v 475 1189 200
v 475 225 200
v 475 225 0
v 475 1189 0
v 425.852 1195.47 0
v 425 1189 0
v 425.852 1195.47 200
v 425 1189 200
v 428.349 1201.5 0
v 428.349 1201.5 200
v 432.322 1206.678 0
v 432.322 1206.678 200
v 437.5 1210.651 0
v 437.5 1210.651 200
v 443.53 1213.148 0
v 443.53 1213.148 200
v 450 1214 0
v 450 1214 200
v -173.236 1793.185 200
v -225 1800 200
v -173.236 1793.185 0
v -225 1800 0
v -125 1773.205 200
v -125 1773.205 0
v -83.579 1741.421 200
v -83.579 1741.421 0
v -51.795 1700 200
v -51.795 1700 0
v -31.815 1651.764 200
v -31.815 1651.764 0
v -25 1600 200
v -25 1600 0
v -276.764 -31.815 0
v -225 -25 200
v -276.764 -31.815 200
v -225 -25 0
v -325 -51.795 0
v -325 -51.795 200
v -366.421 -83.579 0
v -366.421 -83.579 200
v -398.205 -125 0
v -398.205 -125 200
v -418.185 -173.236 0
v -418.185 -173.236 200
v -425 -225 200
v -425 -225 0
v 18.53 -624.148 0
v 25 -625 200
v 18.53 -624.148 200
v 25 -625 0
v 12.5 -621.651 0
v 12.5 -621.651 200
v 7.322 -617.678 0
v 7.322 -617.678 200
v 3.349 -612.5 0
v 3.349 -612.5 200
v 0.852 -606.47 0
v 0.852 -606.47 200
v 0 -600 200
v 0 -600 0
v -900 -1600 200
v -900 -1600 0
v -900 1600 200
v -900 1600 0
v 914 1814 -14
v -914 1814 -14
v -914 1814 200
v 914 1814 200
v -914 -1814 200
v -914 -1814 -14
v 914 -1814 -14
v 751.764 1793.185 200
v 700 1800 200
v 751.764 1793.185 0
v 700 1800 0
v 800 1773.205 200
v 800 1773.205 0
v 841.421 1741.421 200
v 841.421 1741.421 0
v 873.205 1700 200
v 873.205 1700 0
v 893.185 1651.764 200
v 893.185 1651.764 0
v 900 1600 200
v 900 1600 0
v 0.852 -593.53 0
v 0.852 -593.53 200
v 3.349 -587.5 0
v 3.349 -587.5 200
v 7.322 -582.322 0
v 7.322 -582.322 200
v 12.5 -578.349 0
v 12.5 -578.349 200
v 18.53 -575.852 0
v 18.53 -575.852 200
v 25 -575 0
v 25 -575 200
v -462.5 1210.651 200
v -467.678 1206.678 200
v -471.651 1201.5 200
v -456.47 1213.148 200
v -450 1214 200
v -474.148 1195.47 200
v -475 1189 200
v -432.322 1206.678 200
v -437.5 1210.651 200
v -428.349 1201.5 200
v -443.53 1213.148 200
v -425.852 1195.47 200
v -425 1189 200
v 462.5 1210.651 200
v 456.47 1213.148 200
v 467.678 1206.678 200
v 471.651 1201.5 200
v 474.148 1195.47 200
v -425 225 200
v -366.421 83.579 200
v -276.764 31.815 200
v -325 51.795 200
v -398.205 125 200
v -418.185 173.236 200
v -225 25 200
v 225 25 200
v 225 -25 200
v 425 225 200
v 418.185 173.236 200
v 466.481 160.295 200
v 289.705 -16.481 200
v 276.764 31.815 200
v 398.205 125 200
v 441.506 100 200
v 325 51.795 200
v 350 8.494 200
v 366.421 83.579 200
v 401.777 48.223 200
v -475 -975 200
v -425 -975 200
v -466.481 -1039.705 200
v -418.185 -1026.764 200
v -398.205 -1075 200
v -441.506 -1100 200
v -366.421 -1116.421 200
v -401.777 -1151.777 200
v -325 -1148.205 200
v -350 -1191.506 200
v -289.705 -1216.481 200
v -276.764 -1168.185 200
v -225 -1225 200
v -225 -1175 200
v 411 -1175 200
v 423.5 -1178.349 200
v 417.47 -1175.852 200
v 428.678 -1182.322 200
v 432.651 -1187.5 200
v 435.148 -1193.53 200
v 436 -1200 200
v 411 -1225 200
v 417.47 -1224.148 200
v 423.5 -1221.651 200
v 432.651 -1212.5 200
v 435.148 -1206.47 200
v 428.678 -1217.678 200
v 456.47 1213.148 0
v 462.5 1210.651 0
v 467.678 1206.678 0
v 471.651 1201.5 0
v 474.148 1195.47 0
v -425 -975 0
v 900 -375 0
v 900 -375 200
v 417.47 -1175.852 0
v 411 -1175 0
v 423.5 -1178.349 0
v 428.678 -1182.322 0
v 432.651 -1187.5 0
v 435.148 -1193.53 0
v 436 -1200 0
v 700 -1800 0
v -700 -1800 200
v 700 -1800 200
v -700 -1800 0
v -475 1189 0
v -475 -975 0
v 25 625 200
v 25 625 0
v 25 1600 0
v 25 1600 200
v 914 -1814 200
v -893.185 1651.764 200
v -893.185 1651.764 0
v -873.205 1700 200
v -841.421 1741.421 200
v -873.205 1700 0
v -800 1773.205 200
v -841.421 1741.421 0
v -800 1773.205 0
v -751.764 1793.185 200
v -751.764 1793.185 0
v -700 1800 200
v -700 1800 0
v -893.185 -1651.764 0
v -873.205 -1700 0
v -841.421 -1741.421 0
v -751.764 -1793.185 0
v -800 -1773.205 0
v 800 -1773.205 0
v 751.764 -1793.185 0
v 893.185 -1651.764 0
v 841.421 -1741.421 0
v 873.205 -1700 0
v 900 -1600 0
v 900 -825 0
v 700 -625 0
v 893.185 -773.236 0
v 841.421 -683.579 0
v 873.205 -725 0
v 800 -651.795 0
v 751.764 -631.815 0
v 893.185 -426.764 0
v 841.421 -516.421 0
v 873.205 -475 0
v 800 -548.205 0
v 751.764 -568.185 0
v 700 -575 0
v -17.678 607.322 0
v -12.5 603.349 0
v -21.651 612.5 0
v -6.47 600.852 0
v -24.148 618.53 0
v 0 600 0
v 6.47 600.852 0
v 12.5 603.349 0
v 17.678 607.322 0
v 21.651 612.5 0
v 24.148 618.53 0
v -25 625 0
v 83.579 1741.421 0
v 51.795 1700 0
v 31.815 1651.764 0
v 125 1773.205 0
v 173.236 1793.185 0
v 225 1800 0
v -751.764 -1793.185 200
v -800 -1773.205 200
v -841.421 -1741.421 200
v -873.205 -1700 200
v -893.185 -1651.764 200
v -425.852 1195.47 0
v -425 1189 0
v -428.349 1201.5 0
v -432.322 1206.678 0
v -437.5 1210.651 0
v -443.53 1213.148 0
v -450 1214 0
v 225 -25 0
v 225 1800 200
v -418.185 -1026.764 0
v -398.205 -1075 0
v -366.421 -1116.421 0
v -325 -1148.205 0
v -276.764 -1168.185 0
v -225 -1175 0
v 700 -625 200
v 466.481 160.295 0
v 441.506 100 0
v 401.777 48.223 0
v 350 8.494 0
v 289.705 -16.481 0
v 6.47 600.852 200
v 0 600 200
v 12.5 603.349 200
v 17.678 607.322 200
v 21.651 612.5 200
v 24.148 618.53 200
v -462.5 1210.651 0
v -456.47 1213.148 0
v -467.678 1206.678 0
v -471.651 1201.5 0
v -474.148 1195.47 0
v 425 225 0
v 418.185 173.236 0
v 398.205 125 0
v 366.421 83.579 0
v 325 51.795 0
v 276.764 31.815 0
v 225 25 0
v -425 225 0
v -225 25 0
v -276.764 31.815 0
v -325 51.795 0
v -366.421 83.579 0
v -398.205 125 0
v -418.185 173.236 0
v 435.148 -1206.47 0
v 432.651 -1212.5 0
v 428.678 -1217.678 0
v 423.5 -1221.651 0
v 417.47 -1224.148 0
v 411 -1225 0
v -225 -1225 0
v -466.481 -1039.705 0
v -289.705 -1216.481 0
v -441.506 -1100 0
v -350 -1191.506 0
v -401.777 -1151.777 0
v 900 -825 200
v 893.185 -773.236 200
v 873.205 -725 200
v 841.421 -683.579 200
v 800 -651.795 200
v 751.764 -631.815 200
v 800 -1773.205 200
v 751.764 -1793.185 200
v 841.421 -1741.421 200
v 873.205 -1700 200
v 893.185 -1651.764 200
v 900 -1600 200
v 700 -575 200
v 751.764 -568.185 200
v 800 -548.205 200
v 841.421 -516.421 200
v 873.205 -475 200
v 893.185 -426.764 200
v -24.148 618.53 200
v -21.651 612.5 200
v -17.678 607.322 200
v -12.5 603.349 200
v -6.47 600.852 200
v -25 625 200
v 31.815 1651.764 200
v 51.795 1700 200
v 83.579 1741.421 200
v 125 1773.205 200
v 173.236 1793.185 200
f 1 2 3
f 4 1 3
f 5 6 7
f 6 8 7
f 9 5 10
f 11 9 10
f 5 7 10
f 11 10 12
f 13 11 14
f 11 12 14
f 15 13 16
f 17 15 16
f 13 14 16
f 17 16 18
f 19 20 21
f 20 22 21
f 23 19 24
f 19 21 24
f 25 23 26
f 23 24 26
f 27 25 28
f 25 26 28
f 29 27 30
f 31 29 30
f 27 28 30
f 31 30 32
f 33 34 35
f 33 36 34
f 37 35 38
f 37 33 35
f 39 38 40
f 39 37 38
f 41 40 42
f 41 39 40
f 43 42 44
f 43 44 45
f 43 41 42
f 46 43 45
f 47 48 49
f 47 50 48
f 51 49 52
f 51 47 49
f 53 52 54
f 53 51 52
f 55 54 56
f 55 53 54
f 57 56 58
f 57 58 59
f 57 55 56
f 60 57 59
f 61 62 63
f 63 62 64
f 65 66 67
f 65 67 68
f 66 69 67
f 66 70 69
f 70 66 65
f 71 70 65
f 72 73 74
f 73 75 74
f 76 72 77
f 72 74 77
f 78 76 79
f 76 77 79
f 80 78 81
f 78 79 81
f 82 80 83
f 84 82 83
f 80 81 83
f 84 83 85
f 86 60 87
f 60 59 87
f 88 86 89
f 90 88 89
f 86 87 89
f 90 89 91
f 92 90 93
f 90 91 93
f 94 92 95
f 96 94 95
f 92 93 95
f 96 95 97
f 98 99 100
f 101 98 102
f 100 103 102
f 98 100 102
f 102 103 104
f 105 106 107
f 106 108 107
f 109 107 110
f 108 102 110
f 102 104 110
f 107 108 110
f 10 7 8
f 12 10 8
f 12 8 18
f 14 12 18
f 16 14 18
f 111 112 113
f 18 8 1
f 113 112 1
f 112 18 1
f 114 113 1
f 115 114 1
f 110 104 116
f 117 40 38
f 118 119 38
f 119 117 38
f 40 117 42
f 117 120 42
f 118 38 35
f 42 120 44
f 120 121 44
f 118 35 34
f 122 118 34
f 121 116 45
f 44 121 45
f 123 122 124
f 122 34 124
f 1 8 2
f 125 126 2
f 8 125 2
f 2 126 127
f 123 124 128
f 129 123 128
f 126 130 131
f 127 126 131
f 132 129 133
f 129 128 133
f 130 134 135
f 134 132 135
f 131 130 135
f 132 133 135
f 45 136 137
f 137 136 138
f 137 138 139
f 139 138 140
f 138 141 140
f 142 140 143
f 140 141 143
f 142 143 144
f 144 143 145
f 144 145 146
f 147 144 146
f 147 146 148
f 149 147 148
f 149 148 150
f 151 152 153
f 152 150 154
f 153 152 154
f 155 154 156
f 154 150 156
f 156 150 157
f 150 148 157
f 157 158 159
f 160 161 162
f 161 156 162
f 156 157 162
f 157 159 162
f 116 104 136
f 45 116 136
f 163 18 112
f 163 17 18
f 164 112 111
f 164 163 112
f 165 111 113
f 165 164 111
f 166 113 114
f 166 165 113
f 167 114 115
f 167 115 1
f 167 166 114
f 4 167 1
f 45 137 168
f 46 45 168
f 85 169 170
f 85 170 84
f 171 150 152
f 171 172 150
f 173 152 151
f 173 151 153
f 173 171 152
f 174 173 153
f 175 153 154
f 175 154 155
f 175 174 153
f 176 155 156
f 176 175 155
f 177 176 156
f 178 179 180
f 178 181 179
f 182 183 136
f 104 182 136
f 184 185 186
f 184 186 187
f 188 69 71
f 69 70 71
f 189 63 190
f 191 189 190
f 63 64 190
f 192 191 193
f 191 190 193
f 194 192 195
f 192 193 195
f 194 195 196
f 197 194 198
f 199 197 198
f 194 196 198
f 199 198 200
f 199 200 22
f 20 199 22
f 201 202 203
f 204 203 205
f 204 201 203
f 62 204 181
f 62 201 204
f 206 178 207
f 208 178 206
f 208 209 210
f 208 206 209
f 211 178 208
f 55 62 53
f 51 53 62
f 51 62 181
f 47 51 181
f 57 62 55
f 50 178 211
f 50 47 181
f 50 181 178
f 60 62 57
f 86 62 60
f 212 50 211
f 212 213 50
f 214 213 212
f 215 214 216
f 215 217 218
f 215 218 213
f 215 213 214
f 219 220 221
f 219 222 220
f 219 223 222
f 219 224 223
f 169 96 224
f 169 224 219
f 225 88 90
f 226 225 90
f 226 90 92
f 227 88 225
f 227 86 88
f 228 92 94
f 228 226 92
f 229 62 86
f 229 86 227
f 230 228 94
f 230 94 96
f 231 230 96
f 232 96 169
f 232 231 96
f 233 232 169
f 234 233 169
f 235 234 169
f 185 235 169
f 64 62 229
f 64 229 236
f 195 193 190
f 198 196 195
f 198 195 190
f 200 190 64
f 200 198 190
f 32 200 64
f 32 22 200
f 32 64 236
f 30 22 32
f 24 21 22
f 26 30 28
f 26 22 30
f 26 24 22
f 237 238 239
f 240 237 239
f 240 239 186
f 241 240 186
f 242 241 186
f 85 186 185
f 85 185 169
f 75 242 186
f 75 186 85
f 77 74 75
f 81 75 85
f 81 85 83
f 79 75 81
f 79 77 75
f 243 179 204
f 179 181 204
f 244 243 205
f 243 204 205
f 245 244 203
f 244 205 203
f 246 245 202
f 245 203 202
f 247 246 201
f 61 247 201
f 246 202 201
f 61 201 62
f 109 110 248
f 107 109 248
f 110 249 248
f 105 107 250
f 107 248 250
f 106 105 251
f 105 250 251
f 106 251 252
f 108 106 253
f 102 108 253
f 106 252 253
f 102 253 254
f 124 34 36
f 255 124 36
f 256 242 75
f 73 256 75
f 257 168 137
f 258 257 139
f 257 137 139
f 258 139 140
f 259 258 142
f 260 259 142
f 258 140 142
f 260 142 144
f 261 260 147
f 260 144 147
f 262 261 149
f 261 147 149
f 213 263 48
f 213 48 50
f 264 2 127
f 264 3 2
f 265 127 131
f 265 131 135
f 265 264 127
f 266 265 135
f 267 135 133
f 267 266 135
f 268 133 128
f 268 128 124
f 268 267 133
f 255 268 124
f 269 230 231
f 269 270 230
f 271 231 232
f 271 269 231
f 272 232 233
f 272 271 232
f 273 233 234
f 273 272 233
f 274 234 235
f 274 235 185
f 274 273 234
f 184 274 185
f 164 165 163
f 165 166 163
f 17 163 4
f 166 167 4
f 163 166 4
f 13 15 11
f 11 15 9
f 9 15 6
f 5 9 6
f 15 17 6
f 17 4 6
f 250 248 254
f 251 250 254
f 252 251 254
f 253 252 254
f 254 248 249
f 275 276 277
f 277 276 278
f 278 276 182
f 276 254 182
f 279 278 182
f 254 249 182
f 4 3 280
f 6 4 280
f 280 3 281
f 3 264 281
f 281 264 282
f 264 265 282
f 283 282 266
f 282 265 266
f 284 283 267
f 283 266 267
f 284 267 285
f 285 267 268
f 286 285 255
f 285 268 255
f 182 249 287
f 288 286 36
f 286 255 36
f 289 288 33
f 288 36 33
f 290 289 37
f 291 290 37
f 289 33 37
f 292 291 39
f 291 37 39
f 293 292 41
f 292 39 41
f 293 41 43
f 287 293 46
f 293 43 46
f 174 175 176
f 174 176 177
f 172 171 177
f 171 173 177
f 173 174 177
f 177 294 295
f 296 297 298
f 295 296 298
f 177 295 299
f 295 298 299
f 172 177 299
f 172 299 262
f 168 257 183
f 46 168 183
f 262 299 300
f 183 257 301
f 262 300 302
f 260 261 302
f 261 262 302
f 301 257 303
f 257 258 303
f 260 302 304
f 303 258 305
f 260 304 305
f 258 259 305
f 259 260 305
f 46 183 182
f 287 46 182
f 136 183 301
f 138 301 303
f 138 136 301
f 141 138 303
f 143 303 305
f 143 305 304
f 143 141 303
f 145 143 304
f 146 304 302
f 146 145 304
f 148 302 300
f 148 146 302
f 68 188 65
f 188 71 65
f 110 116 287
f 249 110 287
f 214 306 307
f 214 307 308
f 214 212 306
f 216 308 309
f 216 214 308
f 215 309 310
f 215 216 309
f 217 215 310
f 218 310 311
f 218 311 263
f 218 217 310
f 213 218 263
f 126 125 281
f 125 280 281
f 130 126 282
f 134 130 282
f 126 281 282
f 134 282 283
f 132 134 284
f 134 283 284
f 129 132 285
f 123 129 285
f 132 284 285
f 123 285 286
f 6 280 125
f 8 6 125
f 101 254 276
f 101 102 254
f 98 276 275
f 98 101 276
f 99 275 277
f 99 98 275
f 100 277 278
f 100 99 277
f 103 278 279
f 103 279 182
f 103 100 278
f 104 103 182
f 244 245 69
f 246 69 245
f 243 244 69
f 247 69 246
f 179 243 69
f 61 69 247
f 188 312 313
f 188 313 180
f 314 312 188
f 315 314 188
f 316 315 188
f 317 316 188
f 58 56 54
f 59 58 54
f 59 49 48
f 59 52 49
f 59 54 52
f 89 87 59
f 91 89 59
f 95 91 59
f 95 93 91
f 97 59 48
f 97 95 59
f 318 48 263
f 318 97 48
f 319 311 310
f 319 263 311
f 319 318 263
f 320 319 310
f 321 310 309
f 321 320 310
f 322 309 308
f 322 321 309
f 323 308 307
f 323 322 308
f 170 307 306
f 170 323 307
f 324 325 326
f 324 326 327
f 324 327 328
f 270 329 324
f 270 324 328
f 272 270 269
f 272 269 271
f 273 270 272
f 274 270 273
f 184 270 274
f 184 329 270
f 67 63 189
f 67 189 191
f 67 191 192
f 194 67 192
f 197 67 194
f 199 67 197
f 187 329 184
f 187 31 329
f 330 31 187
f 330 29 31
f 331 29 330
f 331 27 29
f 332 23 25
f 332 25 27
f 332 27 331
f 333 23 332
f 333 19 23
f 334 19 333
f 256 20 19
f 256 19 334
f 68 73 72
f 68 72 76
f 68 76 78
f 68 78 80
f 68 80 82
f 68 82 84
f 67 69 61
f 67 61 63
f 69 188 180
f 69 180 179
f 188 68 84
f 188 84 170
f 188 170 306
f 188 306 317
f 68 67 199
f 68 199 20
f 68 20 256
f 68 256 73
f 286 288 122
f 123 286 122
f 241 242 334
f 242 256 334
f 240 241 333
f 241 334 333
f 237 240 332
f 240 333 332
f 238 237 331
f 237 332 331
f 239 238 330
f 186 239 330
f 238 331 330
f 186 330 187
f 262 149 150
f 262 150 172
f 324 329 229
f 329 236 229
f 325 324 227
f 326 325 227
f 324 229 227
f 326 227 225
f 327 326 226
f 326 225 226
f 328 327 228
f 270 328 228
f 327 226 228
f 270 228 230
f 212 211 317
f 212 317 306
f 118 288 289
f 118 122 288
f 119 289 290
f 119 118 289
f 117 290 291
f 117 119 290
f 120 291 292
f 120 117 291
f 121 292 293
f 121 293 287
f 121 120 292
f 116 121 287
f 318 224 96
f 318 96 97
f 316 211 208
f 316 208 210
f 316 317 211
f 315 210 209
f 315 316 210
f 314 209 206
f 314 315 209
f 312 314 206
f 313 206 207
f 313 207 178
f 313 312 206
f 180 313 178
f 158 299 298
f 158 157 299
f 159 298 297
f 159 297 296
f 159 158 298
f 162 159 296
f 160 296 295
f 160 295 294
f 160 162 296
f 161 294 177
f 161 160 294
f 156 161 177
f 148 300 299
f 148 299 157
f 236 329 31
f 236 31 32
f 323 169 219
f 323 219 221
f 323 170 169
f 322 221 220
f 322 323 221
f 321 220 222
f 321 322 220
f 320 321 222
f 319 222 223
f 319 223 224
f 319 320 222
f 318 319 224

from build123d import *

# Parameters (mm, degrees)
F6_W          = 1828
F6_H          = 3628
F7_DEPTH      = 14
F7_DEPTH_BACK = 200
F8_T          = -14
F14_W         = 50
F14_H         = 200
F13_W         = 50
F13_H         = 200
F12_W         = 50
F12_H         = 200
F20_R         = 200
F20_2_R       = 200
F21_R         = 24.99999
F21_2_R       = 24.99999
F22_R         = 250


# Not quite as in the source:
# - a fillet or chamfer is up to 0.001 mm smaller than in the source, because OpenCascade refuses the exact size


with BuildPart() as f7:
    # F6 (on Top) → F7 (new body, two sides)
    with BuildSketch(Plane.XY) as f7_sk:
        Rectangle(F6_W, F6_H)
    extrude(amount=-F7_DEPTH)
    extrude(f7_sk.sketch, amount=F7_DEPTH_BACK)

    # F8
    f8_openings = [f7.faces().sort_by_distance(p)[0] for p in [
        (0, 0, 200),
    ]]
    offset(amount=F8_T, openings=f8_openings)

    # F15: sweep along a path in F9
    with BuildLine(Plane.XY) as f15_path:
        Line((0, -600), (900, -600))
    # F14 (on Right) → F15 (sweep)
    with BuildSketch(Plane.YZ):
        with Locations((-600, 100)):
            Rectangle(F14_W, F14_H)
    sweep(path=f15_path.line)

    # F17: sweep along a path in F9
    with BuildLine(Plane.XY) as f17_path:
        Line((0, 1800), (0, 600))
    # F12 (on plane+point) → F17 (sweep)
    with BuildSketch(Plane.XZ.offset(-600)):
        with Locations((0, 100)):
            Rectangle(F12_W, F12_H)
    sweep(path=f17_path.line)

    # F20
    f20_edges = [f7.edges().sort_by_distance(p)[0] for p in [
        (25, 1800, 100),
        (900, 1800, 100),
        (-25, 1800, 100),
        (-900, 1800, 100),
        (-900, -1800, 100),
        (900, -575, 100),
        (900, -625, 100),
        (900, -1800, 100),
    ]]
    fillet(f20_edges, radius=F20_R)

    # F21 (radius 25 in the source; OpenCascade refuses exactly that, so slightly less here)
    f21_edges = [f7.edges().sort_by_distance(p)[0] for p in [
        (-25, 600, 100),
        (25, 600, 100),
        (0, -575, 100),
        (0, -625, 100),
    ]]
    fillet(f21_edges, radius=F21_R)


with BuildPart() as f16:
    # F16: sweep along a path in F9
    with BuildLine(Plane.XY) as f16_path:
        Line((-450, 1200), (-450, -1200))
        Line((-450, -1200), (450, -1200))
    # F13 (on offset) → F16 (sweep)
    with BuildSketch(Plane(origin=(0, 1214, 0), x_dir=(-1, 0, 0), z_dir=(0, 1, 0))):
        with Locations((450, 100)):
            Rectangle(F13_W, F13_H)
    sweep(path=f16_path.line, transition=Transition.RIGHT)

    # F18: sweep along a path in F9
    with BuildLine(Plane.XY) as f18_path:
        Line((450, 1200), (450, 0))
        Line((450, 0), (-450, 0))
    # F13 (on offset) → F18 (sweep)
    with BuildSketch(Plane(origin=(0, 1214, 0), x_dir=(-1, 0, 0), z_dir=(0, 1, 0))):
        with Locations((-450, 100)):
            Rectangle(F13_W, F13_H)
    sweep(path=f18_path.line, transition=Transition.RIGHT)

    # F19: union 

    # F20#2
    f20_2_edges = [f16.edges().sort_by_distance(p)[0] for p in [
        (-425, -1175, 100),
        (425, 25, 100),
        (-425, 25, 100),
        (-425, -25, 100),
    ]]
    fillet(f20_2_edges, radius=F20_2_R)

    # F21#2 (radius 25 in the source; OpenCascade refuses exactly that, so slightly less here)
    f21_2_edges = [f16.edges().sort_by_distance(p)[0] for p in [
        (436, -1175, 100),
        (436, -1225, 100),
        (425, 1214, 100),
        (475, 1214, 100),
        (-475, 1214, 100),
        (-425, 1214, 100),
    ]]
    fillet(f21_2_edges, radius=F21_2_R)

    # F22
    f22_edges = [f16.edges().sort_by_distance(p)[0] for p in [
        (475, -25, 100),
        (-475, -1225, 100),
    ]]
    fillet(f22_edges, radius=F22_R)


solid = Compound([f7.part, f16.part])
